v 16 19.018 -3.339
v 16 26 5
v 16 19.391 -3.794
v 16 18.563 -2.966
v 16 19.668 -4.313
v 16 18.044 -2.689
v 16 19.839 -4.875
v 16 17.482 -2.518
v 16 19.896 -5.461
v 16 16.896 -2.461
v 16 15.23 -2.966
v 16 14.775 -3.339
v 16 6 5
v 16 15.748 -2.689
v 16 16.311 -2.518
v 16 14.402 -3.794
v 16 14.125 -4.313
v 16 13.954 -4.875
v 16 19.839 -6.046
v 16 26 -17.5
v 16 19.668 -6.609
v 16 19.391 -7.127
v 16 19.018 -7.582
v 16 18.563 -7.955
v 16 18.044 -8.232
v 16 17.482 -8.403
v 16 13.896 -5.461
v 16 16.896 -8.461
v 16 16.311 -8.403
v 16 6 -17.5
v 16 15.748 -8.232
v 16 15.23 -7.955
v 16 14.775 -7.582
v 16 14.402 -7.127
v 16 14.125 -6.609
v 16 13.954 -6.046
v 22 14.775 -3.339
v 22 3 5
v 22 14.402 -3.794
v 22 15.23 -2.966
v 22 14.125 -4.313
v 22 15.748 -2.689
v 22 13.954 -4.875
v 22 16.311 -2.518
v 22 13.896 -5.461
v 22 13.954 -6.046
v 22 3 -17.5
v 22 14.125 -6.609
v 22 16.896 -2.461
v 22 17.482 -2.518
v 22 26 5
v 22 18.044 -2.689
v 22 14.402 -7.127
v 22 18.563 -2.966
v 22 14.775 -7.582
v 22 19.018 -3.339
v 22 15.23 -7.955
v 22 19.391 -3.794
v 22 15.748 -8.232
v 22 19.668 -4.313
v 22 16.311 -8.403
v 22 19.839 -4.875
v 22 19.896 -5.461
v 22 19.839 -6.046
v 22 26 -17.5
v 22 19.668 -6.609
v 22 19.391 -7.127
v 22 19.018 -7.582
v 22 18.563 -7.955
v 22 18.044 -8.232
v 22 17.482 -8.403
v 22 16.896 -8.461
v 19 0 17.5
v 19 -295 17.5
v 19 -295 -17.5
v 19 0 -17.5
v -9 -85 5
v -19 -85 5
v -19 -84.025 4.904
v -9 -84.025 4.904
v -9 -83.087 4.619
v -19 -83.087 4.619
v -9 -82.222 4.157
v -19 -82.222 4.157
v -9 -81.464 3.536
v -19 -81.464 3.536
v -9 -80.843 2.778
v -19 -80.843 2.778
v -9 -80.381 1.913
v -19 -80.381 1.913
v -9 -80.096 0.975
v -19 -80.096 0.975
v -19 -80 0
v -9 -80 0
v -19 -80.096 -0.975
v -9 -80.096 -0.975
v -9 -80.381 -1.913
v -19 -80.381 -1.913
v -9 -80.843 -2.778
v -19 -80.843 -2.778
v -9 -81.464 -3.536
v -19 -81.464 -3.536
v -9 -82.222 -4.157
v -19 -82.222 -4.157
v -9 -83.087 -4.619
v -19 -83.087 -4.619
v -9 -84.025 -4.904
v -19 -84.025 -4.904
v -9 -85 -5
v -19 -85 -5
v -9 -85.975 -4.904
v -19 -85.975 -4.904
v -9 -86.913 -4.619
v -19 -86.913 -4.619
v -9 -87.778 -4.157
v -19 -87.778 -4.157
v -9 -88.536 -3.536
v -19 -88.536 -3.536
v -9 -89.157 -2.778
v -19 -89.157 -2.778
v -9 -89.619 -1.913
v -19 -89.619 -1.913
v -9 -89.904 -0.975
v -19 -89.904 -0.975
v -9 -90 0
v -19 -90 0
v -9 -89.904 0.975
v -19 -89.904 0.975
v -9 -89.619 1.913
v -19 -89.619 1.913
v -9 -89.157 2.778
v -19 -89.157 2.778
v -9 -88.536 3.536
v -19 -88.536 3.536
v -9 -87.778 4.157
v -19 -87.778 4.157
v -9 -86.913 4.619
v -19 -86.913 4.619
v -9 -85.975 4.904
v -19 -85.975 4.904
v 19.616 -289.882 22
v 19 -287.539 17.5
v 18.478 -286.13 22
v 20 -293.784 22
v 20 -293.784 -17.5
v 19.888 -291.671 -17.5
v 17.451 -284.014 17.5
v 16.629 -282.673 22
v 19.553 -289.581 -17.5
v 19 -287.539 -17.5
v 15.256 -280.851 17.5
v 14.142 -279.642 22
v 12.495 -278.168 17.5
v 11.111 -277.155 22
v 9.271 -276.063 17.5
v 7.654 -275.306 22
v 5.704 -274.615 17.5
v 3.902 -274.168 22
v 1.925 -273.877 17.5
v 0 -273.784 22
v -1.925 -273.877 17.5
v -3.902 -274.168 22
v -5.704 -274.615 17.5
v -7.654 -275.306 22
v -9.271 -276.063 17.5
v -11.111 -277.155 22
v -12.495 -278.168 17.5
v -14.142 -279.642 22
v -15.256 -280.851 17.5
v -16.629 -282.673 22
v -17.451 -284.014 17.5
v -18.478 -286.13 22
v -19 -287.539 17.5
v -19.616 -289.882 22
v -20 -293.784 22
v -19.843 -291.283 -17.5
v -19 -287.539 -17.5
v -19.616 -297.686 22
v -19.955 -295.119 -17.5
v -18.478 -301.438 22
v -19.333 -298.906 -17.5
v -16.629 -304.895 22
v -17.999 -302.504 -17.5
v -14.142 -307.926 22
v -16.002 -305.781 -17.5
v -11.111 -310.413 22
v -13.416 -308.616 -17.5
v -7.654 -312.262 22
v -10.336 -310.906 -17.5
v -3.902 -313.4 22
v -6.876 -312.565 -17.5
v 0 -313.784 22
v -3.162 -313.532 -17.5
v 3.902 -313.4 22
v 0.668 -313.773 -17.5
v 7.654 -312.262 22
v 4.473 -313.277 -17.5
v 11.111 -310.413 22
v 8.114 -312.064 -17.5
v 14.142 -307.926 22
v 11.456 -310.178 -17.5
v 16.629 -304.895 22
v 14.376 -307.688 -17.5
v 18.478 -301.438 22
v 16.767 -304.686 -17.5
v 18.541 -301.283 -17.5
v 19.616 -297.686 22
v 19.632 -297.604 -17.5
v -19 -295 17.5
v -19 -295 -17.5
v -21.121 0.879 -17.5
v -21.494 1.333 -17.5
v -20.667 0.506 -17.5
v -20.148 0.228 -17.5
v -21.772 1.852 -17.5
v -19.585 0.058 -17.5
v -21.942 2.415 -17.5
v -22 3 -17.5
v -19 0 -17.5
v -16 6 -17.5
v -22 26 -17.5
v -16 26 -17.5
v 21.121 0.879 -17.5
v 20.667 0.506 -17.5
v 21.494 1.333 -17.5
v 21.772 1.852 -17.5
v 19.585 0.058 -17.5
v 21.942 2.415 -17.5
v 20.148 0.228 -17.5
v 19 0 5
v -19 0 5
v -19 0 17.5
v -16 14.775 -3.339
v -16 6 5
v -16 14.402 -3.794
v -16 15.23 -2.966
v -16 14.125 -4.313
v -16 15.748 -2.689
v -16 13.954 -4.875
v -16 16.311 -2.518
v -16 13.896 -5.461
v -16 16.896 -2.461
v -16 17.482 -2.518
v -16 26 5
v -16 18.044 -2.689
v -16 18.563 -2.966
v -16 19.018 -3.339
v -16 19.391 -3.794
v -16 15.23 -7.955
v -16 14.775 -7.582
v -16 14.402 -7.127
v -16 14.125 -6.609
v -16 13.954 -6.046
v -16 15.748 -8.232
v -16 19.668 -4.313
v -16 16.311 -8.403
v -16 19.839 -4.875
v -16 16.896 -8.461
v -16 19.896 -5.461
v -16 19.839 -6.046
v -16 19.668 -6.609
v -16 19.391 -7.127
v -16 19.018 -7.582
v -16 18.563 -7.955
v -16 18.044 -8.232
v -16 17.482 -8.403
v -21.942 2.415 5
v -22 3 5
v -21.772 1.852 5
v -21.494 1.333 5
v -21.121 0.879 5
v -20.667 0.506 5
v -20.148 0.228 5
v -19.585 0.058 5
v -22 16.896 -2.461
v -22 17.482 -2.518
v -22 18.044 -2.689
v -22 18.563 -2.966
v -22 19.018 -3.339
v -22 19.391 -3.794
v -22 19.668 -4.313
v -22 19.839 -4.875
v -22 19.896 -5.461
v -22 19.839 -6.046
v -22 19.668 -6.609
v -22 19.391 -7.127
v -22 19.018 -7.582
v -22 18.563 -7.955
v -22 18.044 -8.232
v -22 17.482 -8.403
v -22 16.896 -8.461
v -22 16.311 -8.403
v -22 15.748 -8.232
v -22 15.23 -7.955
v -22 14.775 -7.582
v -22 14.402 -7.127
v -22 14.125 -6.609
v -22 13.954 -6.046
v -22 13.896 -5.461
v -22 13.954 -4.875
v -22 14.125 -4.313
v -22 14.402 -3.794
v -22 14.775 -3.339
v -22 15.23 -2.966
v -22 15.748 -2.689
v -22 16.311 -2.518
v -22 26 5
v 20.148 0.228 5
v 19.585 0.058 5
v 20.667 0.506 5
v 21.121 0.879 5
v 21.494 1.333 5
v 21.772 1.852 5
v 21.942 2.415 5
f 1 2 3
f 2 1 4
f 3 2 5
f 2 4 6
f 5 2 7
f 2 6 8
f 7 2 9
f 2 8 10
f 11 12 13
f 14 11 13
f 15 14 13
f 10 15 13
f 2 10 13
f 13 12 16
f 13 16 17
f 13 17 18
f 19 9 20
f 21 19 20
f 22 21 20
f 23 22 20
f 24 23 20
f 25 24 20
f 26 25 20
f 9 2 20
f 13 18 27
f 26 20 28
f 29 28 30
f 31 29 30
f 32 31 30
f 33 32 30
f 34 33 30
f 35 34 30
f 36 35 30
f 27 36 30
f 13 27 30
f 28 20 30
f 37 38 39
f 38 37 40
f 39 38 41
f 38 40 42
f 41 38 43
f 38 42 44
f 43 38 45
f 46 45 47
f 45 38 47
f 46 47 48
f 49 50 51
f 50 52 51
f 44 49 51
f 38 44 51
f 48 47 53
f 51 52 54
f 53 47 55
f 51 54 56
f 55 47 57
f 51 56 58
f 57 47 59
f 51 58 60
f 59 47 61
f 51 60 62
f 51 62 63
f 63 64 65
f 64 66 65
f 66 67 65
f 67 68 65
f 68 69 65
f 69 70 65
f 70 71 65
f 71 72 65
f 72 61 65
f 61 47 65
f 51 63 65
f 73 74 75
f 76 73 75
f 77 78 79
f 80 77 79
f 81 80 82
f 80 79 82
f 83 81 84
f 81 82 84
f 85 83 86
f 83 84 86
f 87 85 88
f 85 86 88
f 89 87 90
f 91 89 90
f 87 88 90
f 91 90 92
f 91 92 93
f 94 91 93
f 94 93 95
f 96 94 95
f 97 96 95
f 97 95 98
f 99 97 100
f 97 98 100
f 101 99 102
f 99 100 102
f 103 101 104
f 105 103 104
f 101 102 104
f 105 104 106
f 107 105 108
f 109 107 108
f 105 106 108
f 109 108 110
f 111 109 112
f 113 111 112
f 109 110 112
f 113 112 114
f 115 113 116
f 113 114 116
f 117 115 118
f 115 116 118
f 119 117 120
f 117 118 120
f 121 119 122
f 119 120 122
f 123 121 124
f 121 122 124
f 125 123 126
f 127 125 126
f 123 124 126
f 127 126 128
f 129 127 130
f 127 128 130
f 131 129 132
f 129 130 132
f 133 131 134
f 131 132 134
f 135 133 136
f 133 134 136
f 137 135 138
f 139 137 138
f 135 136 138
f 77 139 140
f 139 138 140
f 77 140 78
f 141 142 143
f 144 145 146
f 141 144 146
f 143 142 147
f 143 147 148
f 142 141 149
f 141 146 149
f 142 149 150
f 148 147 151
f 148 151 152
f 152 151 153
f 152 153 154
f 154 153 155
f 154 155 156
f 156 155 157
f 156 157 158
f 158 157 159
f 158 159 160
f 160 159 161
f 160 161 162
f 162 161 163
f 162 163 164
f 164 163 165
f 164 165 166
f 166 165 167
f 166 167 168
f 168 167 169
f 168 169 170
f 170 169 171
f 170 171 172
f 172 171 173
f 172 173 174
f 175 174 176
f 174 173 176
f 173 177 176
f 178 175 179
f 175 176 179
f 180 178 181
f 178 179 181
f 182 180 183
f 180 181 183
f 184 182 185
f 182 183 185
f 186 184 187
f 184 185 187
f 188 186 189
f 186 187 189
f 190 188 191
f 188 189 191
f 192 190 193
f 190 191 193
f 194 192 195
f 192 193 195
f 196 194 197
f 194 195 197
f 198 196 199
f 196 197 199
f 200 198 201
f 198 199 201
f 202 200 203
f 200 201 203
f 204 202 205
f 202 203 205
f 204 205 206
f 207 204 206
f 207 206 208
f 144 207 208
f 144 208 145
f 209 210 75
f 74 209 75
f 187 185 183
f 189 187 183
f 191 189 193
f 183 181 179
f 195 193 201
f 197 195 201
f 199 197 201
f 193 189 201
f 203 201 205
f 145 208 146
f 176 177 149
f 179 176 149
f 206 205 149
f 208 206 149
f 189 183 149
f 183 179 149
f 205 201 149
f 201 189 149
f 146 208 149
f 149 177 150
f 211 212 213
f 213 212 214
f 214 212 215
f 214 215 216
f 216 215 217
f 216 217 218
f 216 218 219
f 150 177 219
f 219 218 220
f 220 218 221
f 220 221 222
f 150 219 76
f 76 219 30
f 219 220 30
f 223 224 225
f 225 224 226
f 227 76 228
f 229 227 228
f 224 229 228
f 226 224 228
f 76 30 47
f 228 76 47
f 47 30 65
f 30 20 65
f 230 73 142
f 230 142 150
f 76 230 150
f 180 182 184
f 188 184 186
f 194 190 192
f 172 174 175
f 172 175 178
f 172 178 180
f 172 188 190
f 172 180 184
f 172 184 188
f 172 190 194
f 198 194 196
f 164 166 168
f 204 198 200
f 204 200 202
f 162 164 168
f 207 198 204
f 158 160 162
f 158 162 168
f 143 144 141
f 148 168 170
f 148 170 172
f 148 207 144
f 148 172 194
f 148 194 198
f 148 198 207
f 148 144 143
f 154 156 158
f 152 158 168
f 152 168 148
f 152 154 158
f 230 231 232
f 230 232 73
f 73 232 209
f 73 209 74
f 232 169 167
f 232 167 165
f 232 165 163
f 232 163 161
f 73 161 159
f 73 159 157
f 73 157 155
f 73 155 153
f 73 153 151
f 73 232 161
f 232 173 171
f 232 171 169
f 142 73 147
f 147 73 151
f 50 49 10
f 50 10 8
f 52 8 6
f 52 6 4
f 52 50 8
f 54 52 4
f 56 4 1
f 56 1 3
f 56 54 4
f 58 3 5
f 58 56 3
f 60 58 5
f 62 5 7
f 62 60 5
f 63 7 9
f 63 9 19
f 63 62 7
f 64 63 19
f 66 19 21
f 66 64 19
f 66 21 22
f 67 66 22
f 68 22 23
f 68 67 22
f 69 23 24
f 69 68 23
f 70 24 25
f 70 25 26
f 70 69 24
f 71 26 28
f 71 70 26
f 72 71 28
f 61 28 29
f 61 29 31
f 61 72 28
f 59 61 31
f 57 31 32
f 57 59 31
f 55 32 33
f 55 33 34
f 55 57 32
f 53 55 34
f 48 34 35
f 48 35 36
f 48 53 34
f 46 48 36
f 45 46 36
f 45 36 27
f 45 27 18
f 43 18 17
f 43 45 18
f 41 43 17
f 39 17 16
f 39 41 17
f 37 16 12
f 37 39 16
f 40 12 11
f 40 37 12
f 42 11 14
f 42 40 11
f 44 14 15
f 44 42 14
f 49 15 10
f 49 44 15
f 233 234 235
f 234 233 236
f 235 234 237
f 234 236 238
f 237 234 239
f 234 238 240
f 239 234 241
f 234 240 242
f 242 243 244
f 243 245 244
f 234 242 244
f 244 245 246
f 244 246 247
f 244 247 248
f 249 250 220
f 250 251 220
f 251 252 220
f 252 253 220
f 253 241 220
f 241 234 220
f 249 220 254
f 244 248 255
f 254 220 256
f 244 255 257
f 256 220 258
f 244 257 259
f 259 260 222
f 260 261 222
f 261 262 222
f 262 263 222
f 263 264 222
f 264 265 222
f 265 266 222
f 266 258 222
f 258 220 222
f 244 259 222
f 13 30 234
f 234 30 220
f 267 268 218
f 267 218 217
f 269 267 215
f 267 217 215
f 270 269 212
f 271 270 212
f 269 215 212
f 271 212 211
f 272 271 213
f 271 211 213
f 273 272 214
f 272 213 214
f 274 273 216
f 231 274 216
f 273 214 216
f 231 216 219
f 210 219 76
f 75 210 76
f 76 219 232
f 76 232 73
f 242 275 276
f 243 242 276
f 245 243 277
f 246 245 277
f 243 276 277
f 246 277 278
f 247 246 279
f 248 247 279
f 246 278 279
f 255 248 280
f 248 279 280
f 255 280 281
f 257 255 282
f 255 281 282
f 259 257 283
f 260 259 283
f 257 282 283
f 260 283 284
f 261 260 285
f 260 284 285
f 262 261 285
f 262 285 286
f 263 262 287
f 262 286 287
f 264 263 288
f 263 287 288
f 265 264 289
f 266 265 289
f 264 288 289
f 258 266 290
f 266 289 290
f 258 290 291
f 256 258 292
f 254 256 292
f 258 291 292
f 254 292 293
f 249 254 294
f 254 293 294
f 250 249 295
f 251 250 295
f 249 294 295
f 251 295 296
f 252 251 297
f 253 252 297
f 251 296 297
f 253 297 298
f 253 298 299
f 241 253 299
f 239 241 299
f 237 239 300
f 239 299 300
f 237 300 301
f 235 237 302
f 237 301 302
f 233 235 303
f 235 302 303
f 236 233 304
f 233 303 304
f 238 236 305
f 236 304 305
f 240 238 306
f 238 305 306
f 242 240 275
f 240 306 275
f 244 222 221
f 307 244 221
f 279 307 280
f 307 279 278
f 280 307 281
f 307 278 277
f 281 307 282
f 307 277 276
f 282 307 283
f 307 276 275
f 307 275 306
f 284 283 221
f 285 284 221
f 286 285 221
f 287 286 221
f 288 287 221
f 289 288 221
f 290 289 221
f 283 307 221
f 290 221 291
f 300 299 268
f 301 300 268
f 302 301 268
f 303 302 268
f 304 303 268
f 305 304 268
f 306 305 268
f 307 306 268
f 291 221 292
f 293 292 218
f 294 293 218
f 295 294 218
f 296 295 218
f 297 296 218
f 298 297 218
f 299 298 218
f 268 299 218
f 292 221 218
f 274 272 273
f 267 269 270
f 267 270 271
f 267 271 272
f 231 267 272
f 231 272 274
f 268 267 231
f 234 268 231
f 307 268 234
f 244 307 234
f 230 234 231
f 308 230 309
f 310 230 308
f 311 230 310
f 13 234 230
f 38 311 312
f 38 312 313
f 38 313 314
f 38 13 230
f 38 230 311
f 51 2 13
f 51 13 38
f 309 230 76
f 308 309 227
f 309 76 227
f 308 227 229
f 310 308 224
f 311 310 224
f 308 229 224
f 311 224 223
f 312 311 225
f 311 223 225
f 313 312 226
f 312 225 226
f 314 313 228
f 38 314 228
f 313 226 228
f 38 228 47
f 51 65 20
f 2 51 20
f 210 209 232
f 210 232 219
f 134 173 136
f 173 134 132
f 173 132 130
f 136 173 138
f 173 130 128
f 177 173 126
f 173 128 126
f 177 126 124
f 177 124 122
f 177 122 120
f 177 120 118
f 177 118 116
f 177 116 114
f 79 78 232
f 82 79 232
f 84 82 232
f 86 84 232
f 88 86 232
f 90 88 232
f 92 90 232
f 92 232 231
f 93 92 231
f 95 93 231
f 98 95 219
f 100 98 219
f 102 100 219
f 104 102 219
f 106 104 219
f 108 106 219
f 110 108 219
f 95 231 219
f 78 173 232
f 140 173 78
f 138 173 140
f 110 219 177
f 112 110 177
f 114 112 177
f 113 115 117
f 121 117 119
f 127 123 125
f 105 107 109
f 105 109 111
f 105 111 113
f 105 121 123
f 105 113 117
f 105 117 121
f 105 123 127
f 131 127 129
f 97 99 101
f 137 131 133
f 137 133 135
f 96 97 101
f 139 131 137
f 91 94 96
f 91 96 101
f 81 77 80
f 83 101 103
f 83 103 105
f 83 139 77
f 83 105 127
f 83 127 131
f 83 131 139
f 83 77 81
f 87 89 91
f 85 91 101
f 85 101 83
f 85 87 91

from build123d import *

# Parameters (mm, degrees)
SKETCH1_W                = 38
SKETCH1_H                = 35
BOSS_EXTRUDE1_DEPTH      = 295
BOSS_EXTRUDE3_DEPTH      = 5
BOSS_EXTRUDE3_DEPTH_BACK = 17.5
SKETCH1_3_W              = 38
SKETCH1_3_H              = 35
BOSS_EXTRUDE6_DEPTH      = 295
CUT_EXTRUDE1_START       = -6
SKETCH3_R                = 3
CUT_EXTRUDE1_DEPTH       = 6
BOSS_EXTRUDE8_DEPTH      = 22
BOSS_EXTRUDE8_DEPTH_BACK = 17.5
SKETCH5_R                = 20
SKETCH8_R                = 5
CUT_EXTRUDE2_DEPTH       = 10


with BuildPart() as part:
    # Sketch1 → Boss-Extrude1 (new body)
    with BuildSketch(Plane(origin=(0, 0, 0), x_dir=(1, 0, 0), z_dir=(0, 1, 0))):
        Rectangle(SKETCH1_W, SKETCH1_H)
    extrude(amount=-BOSS_EXTRUDE1_DEPTH)


with BuildPart() as body_2:
    # Sketch2 → Boss-Extrude3 (new, two sides: drawn at the far end of the back side and taken through both)
    with BuildSketch(Plane.XY.offset(-BOSS_EXTRUDE3_DEPTH_BACK)):
        with BuildLine():
            Line((-19, 0), (19, 0))
            ThreePointArc((19, 0), (21.121320344, 0.878679656), (22, 3))
            Line((22, 3), (22, 26))
            Line((22, 26), (16, 26))
            Line((16, 26), (16, 6))
            Line((16, 6), (-16, 6))
            Line((-16, 6), (-16, 26))
            Line((-16, 26), (-22, 26))
            Line((-22, 26), (-22, 3))
            ThreePointArc((-22, 3), (-21.121320344, 0.878679656), (-19, 0))
        make_face()
    extrude(amount=BOSS_EXTRUDE3_DEPTH + BOSS_EXTRUDE3_DEPTH_BACK)

    # Sketch1<3> → Boss-Extrude6 (add)
    with BuildSketch(Plane(origin=(0, 0, 0), x_dir=(1, 0, 0), z_dir=(0, 1, 0))):
        Rectangle(SKETCH1_3_W, SKETCH1_3_H)
    extrude(amount=-BOSS_EXTRUDE6_DEPTH)

    # Sketch3 → Cut-Extrude1 (cut)
    with BuildSketch(Plane.ZY.offset(-16).offset(CUT_EXTRUDE1_START)):
        with Locations((-5.46063237, 16.89632523)):
            Circle(SKETCH3_R)
    cut_extrude1 = extrude(amount=CUT_EXTRUDE1_DEPTH, mode=Mode.SUBTRACT)

    # Mirror1: Cut-Extrude1 across plane
    add(cut_extrude1.mirror(Plane(origin=(0, 0, 0), x_dir=(0, 0, 1), z_dir=(1, 0, 0))), mode=Mode.SUBTRACT)

    # Sketch5 → Boss-Extrude8 (add, two sides: drawn at the far end of the back side and taken through both)
    with BuildSketch(Plane.XY.offset(-BOSS_EXTRUDE8_DEPTH_BACK)):
        with Locations((0, -293.783942795)):
            Circle(SKETCH5_R)
    extrude(amount=BOSS_EXTRUDE8_DEPTH + BOSS_EXTRUDE8_DEPTH_BACK)

    # Sketch8 → Cut-Extrude2 (cut)
    with BuildSketch(Plane.ZY.offset(19)):
        with Locations((0, -85)):
            Circle(SKETCH8_R)
    extrude(amount=-CUT_EXTRUDE2_DEPTH, mode=Mode.SUBTRACT)


solid = Compound([part.part, body_2.part])
